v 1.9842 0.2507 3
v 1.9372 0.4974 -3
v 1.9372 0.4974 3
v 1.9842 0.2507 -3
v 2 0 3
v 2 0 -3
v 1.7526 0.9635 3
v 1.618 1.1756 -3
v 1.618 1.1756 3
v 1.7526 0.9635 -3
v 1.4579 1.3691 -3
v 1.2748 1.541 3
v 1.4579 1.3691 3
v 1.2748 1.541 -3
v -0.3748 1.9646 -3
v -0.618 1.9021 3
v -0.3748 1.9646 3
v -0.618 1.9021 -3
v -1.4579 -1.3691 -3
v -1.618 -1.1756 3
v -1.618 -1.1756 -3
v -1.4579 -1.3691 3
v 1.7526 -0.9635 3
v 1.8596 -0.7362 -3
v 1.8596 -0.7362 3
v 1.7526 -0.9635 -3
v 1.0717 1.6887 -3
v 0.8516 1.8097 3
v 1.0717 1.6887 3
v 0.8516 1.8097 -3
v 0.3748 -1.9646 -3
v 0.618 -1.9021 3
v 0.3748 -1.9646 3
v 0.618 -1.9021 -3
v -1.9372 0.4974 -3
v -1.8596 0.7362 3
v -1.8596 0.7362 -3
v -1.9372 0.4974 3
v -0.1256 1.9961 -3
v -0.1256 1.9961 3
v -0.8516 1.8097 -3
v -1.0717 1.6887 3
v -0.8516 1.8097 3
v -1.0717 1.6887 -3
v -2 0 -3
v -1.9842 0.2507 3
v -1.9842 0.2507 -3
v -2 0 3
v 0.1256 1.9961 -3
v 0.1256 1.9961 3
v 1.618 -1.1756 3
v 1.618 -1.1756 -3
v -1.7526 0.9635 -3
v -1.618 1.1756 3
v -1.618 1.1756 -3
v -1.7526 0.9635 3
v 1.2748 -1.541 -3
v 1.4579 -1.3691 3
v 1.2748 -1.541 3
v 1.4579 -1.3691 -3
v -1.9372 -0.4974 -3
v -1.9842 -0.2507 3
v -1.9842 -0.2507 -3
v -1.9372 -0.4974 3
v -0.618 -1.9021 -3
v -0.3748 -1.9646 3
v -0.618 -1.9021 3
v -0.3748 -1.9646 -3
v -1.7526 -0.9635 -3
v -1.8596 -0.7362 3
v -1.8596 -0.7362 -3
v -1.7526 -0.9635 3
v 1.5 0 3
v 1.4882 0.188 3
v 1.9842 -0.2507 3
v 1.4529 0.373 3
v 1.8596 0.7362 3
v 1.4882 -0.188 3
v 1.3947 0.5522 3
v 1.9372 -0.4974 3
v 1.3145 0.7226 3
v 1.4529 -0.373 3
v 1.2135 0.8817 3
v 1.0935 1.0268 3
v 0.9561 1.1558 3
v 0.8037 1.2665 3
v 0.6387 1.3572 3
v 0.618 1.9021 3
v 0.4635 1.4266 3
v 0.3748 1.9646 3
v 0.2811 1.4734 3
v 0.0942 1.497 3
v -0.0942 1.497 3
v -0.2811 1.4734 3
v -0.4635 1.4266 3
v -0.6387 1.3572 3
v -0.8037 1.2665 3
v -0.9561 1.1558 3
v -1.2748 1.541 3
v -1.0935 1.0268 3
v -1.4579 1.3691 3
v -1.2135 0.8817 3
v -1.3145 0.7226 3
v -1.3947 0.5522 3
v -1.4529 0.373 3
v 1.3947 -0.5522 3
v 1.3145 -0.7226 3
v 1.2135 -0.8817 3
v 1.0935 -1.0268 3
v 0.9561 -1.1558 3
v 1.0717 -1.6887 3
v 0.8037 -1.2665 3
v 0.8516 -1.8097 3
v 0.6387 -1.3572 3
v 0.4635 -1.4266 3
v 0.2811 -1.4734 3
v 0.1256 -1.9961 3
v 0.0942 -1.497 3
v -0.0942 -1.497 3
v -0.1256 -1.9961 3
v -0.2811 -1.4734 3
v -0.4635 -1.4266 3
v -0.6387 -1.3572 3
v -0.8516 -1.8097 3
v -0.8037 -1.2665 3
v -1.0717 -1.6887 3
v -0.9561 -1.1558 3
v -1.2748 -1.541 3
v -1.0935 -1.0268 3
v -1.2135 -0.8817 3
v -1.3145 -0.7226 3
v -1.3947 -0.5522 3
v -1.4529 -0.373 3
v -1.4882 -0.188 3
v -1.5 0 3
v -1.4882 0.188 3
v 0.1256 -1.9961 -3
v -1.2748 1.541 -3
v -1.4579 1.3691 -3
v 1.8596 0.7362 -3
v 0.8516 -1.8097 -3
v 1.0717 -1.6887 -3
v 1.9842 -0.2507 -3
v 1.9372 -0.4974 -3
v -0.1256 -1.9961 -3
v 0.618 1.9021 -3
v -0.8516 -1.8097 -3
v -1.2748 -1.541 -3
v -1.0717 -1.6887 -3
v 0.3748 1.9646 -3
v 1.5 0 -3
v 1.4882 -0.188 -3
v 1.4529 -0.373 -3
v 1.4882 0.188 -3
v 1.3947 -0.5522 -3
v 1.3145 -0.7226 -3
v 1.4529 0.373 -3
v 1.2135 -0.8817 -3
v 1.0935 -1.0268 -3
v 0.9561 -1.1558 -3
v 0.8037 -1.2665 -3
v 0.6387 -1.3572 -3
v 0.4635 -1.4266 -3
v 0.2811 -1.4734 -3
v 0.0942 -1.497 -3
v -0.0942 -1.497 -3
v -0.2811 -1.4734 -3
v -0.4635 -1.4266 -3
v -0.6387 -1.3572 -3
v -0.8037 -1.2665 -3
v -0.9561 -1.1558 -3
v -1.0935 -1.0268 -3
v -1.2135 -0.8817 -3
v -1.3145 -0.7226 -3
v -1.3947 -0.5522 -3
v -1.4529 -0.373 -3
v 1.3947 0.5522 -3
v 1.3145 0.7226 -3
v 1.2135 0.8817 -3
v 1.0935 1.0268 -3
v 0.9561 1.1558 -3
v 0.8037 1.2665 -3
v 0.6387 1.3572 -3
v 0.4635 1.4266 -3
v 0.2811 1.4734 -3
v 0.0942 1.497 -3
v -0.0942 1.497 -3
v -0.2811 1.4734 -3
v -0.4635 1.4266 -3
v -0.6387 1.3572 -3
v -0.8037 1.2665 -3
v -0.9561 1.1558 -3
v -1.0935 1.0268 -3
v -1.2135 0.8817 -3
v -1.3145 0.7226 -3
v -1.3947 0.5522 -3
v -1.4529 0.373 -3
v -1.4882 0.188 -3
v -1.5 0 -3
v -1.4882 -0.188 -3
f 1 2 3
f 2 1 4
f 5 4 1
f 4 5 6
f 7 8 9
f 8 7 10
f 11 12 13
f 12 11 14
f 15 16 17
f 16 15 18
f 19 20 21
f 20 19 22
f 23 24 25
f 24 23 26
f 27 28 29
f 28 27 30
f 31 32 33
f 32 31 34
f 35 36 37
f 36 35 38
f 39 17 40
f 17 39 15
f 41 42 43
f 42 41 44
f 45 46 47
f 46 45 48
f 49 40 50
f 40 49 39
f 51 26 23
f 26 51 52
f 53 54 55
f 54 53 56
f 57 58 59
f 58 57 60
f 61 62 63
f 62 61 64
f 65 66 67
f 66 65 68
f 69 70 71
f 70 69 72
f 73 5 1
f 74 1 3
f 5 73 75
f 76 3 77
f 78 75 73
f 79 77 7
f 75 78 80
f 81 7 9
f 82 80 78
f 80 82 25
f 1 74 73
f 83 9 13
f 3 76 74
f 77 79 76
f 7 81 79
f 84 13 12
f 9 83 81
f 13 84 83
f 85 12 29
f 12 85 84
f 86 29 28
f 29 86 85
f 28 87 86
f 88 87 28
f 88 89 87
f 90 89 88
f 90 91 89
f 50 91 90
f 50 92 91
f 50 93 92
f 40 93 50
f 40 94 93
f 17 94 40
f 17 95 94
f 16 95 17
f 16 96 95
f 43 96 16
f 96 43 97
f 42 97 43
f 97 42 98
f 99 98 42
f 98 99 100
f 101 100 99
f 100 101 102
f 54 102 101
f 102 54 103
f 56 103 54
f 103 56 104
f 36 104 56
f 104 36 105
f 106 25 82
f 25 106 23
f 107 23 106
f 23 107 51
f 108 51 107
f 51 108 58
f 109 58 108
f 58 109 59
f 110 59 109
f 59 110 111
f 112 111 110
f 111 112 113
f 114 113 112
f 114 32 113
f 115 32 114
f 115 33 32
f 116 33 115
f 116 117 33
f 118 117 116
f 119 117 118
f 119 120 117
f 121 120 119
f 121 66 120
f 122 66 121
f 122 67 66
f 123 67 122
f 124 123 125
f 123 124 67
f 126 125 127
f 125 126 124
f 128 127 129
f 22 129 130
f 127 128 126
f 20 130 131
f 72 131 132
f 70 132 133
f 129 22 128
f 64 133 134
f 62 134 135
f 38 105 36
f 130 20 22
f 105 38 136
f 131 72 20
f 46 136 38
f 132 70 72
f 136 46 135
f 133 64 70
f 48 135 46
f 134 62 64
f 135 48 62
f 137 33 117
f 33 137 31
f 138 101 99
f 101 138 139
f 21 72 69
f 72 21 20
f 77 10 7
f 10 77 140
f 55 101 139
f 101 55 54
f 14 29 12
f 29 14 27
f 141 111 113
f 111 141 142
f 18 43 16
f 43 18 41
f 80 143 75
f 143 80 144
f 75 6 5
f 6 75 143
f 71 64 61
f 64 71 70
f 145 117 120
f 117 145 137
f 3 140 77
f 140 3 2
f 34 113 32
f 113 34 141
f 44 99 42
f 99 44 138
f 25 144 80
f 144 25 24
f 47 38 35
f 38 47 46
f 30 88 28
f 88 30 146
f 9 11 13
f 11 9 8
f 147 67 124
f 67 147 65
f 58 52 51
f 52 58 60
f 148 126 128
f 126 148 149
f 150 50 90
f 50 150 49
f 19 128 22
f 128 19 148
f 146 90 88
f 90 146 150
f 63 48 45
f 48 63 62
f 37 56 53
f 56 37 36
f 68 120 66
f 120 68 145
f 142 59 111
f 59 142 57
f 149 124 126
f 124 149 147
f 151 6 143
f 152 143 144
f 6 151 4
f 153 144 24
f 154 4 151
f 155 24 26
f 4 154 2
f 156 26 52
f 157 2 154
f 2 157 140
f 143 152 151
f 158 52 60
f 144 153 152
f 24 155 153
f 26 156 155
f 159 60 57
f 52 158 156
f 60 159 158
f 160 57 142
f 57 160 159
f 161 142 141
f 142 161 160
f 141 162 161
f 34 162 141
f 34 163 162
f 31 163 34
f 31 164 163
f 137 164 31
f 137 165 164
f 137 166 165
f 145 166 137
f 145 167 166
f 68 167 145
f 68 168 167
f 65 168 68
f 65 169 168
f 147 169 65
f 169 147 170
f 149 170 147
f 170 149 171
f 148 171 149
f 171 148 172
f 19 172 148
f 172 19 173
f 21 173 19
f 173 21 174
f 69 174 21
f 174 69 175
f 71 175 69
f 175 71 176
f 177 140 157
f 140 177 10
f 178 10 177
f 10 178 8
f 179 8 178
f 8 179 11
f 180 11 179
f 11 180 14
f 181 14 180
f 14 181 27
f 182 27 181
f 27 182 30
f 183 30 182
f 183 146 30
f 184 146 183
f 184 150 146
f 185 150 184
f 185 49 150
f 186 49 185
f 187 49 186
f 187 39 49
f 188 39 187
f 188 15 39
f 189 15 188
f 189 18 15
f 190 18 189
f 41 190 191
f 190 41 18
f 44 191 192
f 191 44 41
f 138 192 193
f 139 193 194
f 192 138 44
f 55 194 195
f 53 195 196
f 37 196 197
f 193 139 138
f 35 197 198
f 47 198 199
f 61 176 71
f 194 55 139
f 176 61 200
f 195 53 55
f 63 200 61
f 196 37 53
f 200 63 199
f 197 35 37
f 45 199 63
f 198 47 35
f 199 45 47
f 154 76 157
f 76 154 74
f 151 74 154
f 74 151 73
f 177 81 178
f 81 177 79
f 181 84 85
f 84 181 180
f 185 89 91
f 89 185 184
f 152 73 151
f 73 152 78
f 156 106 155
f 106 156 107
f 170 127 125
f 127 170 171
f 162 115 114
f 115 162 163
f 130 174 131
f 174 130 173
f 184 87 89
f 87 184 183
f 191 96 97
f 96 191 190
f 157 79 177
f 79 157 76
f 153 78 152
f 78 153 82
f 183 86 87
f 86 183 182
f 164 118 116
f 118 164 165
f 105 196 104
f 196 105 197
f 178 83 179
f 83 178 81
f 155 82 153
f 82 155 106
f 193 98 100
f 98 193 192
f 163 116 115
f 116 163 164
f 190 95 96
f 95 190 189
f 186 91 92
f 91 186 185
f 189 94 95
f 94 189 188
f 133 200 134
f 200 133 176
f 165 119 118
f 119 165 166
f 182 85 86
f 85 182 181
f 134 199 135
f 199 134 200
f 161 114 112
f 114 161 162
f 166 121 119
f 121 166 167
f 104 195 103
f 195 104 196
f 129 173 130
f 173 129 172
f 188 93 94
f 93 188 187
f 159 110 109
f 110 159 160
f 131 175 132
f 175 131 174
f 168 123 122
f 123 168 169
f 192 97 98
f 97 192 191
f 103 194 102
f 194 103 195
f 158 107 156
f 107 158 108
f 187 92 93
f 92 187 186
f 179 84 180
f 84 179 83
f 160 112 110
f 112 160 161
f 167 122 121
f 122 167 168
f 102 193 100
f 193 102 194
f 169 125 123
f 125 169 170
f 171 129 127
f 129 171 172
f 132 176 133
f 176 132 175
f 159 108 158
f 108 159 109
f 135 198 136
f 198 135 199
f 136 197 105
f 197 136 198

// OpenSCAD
$fn = 50;


difference() {
	union() {
		translate(v = [0, 0, -3.0000000000]) {
			cylinder(h = 6, r = 2.0000000000);
		}
	}
	union() {
		translate(v = [0, 0, -100.0000000000]) {
			cylinder(h = 200, r = 1.5000000000);
		}
	}
}
